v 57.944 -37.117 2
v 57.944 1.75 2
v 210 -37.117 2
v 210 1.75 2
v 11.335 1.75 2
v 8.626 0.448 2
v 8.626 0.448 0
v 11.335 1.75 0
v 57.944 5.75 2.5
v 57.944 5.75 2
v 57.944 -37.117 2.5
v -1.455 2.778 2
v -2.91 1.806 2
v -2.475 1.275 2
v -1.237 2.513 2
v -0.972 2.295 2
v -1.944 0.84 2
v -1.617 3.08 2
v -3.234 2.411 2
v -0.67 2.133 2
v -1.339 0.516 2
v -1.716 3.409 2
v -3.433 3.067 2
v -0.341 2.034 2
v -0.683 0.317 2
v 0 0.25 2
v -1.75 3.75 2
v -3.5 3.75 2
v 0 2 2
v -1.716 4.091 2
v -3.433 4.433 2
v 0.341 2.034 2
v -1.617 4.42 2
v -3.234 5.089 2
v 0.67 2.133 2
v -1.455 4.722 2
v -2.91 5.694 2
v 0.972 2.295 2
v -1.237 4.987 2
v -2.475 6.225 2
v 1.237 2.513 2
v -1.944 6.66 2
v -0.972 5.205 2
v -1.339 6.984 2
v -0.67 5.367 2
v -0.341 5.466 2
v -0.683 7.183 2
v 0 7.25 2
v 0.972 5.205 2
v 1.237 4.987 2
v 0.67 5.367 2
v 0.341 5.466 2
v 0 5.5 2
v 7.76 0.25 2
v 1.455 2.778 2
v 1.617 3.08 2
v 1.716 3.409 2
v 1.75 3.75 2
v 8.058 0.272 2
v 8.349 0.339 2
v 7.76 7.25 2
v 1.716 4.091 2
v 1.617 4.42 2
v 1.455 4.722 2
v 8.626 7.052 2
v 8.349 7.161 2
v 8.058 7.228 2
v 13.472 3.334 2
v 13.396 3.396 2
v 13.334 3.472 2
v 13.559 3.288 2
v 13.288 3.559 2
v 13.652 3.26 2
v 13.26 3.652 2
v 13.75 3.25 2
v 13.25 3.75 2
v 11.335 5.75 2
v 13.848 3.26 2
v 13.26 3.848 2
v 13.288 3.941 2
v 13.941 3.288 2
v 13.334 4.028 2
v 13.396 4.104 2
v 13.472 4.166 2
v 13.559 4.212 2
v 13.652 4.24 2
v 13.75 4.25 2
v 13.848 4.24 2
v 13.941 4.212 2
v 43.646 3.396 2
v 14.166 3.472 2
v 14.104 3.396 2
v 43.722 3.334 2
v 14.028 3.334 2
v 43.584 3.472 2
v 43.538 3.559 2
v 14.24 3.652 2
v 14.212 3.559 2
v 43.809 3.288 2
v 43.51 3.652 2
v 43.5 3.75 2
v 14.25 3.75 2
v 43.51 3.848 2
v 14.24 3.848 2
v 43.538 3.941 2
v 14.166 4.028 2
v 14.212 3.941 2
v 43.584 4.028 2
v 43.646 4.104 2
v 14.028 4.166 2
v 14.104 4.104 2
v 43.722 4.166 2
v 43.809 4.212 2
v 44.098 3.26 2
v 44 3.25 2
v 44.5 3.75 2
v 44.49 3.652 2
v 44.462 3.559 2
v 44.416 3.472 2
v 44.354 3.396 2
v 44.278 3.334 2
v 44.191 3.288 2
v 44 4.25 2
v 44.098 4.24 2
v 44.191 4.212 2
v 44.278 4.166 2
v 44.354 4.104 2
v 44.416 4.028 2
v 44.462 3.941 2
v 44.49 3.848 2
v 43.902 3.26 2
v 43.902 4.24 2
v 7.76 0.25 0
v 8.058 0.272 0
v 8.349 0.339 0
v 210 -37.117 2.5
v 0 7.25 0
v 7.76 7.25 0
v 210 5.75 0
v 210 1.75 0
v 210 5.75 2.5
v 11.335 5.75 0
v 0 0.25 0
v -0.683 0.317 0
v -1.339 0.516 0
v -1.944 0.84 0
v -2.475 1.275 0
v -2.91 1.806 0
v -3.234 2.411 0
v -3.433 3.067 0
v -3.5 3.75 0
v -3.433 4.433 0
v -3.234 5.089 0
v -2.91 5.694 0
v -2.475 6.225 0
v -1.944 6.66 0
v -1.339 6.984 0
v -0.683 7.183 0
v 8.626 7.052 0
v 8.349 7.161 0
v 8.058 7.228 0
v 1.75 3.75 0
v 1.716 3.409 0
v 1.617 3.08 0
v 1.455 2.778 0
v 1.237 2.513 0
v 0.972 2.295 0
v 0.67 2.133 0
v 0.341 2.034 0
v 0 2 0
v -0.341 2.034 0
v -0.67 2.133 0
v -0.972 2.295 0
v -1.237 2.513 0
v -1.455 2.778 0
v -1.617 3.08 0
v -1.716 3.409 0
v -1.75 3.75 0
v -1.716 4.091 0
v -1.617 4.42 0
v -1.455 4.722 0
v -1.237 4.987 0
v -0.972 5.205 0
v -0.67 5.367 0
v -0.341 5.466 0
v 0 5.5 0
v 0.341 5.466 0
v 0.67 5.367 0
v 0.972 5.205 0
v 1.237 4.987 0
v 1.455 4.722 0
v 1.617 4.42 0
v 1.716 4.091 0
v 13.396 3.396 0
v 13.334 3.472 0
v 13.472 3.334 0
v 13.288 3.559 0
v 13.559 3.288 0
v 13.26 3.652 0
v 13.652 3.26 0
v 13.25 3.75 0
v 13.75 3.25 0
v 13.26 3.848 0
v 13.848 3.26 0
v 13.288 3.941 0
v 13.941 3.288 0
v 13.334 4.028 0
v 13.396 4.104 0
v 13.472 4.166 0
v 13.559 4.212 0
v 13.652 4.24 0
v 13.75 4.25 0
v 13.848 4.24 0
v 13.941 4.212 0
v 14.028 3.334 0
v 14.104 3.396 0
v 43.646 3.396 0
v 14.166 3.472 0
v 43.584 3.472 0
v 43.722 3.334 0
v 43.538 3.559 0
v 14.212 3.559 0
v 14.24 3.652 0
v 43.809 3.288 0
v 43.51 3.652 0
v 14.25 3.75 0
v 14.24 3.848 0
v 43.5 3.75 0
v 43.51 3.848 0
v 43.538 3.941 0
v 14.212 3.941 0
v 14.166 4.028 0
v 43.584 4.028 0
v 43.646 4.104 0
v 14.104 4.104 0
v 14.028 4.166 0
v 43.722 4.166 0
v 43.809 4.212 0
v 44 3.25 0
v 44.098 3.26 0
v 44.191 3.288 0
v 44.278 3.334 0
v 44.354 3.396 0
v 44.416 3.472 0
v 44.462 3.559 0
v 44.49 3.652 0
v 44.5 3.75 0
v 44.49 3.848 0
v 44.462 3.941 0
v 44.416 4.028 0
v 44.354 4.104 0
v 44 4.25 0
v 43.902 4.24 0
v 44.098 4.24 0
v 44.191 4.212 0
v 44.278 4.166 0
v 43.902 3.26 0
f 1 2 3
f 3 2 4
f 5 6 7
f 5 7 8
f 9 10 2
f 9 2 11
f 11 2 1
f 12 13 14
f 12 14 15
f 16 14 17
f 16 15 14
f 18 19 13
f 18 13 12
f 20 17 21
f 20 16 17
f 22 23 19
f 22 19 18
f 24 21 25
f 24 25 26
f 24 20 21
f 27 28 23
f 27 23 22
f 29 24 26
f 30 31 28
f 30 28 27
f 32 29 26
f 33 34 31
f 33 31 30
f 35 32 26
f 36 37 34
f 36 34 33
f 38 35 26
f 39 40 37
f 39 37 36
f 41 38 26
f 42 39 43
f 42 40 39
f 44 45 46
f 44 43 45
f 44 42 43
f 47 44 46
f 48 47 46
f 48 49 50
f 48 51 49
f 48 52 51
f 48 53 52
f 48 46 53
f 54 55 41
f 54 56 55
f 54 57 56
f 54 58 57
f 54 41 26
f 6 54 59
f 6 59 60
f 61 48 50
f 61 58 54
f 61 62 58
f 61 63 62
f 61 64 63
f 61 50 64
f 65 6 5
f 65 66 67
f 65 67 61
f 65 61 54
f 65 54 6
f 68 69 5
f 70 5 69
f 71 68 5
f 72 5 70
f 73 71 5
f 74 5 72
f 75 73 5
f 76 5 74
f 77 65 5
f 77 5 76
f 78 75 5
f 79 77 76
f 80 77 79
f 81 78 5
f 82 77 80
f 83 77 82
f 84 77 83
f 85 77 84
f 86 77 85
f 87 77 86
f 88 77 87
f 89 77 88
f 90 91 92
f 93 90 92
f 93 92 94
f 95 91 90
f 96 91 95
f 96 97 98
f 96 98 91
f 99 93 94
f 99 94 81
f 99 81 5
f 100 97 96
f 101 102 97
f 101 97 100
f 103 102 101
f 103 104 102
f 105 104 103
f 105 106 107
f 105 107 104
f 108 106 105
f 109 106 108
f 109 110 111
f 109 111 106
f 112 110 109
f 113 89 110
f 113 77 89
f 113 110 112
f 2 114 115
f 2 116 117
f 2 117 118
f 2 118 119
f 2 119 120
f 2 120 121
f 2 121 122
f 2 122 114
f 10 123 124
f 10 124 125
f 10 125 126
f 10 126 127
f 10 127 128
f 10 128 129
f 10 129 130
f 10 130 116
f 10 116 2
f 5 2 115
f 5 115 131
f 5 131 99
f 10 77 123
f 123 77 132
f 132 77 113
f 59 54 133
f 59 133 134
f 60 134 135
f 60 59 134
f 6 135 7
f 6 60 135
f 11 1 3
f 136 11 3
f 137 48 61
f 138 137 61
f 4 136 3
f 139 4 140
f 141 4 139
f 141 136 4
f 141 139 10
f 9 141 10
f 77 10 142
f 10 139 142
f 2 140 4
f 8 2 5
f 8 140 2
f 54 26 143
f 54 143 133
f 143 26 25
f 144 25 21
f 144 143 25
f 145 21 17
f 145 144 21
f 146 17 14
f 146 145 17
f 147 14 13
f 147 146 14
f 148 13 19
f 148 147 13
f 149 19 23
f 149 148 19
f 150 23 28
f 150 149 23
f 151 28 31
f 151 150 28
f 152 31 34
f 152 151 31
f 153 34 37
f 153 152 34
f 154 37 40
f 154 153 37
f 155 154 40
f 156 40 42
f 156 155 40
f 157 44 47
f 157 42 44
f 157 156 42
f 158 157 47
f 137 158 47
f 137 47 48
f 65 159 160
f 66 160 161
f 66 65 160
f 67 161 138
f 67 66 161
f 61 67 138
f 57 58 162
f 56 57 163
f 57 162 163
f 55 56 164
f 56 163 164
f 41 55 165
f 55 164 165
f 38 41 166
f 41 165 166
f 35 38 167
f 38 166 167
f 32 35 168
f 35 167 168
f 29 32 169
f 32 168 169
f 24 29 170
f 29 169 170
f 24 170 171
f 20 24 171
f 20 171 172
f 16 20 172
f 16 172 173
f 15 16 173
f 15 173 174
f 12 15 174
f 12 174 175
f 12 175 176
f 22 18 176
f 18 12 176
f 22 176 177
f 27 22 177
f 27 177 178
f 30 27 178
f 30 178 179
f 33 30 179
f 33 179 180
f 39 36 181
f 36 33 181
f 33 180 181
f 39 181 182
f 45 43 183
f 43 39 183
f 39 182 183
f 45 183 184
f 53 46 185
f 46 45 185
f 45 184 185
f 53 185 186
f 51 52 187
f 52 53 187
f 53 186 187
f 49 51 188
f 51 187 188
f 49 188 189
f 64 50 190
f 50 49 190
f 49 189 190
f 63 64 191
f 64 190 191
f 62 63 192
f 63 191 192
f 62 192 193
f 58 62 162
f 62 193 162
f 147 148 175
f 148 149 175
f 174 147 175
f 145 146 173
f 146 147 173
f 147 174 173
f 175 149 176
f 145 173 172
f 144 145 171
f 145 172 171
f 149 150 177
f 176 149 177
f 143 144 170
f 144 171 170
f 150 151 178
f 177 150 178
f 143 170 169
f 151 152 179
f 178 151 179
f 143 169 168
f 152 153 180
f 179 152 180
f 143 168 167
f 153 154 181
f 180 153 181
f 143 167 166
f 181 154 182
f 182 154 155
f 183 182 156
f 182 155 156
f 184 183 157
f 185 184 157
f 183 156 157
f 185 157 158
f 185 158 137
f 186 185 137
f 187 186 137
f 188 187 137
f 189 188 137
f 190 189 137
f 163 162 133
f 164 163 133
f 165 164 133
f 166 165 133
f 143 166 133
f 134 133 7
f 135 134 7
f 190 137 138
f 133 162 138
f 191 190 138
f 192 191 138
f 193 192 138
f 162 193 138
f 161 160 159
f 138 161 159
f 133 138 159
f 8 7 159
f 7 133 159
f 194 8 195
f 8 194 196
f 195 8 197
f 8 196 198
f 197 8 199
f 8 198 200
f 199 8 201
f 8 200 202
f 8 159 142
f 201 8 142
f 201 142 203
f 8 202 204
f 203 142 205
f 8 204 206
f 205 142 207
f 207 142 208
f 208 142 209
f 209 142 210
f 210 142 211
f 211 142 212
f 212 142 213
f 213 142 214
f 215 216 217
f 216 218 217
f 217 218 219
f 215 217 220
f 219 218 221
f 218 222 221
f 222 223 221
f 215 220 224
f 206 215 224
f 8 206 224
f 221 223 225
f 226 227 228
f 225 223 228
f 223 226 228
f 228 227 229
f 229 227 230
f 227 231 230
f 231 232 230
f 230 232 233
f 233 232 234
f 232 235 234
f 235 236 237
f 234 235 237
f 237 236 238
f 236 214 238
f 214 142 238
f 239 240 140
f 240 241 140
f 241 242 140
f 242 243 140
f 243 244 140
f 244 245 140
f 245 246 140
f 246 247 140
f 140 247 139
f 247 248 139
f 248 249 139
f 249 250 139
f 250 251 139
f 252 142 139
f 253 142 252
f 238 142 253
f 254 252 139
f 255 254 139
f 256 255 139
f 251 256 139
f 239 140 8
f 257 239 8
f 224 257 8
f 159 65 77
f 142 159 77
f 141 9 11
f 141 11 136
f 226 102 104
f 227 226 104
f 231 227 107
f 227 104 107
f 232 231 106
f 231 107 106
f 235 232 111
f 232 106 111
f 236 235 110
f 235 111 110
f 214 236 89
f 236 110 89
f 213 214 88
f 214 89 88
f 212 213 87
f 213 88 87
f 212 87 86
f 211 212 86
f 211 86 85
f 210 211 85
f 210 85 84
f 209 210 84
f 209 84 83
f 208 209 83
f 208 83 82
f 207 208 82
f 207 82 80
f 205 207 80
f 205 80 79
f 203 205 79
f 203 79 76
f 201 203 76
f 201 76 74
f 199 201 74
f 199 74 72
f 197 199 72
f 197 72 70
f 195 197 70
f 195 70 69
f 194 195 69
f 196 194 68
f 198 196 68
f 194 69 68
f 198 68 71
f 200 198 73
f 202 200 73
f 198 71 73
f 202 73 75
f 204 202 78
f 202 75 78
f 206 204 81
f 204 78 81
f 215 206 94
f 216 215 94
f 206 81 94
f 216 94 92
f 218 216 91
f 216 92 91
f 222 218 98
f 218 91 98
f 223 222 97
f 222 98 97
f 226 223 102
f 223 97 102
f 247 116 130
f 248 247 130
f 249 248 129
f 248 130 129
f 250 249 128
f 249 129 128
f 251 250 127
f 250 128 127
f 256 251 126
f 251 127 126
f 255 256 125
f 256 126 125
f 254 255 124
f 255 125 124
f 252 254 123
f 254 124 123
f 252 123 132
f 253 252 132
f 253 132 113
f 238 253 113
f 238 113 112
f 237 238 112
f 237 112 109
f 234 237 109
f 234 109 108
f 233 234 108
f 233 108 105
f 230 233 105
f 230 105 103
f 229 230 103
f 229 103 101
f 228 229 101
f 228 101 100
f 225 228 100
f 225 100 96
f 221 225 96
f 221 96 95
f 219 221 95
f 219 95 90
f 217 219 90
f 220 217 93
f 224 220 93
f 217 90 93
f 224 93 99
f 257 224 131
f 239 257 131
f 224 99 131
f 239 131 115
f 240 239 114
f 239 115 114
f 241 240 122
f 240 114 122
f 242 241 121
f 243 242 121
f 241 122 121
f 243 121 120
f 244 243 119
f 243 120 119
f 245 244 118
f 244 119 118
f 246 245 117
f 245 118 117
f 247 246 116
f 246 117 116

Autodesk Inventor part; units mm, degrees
ref_plane "YZ Plane" through (0, 0, 0) normal (1, 0, 0) x (0, 1, 0)
ref_plane "XZ Plane" through (0, 0, 0) normal (0, 1, 0) x (-1, 0, 0)
ref_plane "XY Plane" through (0, 0, 0) normal (0, 0, 1) x (1, 0, 0)
sketch "Sketch1" plane through (0, 0, 0) normal (0, 0, 1) x (1, 0, 0)
  circle A0 centre (0, 3.75) radius 1.75 projected
  line L0 (3.5, -3.25) -> (11.1738, -3.25) projected
  line L1 (11.1738, -3.25) -> (11.1738, -5.25) projected
  line L2 (11.1738, -5.25) -> (-11.1738, -5.25) projected
  line L3 (-11.1738, -5.25) -> (-11.1738, -3.25) projected
  line L4 (-11.1738, -3.25) -> (-3.5, -3.25) projected
  line L5 (-3.5, -3.25) -> (-3.5, 3.75) projected
  arc A1 (3.5, 3.75) -> (-3.5, 3.75) centre (0, 3.75) ccw projected
  line L6 (3.5, 3.75) -> (3.5, -3.25) projected
  line L7 (44, 1.75) -> (50, 1.75) projected
  circle A2 centre (0, 3.75) radius 3.5
  line L8 (0, 3.75) -> (250, 3.75)
  line L9 (50, 1.75) -> (0, 1.75)
  line L10 (0, 1.75) -> (0, 3.75)
  line L11 (0, 3.75) -> (50, 3.75)
  line L12 (50, 3.75) -> (50, 1.75)
  line L13 (50, 1.75) -> (250, 1.75)
  line L14 (250, 1.75) -> (250, 3.75)
  line L15 (250, 3.75) -> (50, 3.75)
  line L16 (50, 3.75) -> (50, 1.75)
  line L17 (0, 1.75) -> (250, 1.75)
  line L18 (250, 1.75) -> (250, 5.75)
  line L19 (250, 5.75) -> (0, 5.75)
  line L20 (0, 5.75) -> (0, 1.75)
  circle A3 centre (0, 3.75) radius 3.5
  point P0 (0, 0)
  point P1 (2.8723, 1.75)
  point P2 (2.8723, 5.75)
  dimension "d0" = 250
  dimension "d1" = 2
extrude "Extrusion1" add sketch "Sketch1" along normal blind 2 contours L8 A2 L9 L10 A0 | A0 L20 L19 A1 L8 | A0 L10 L9 A2 A1 L19 L20 | L8 L12 L7 L9 L6 | L6 L9 A2 | A1 L19 L18 L8 | L8 L14 L13 L12
sketch "Sketch2" plane through (0, 0, 2) normal (0, 0, 1) x (1, 0, 0)
  line L0 (13, -15.35) -> (13, -12.35) projected
  line L1 (13, -12.35) -> (14.6, -12.35) projected
  line L2 (14.6, -12.35) -> (14.6, -15.35) projected
  line L3 (14.6, -15.35) -> (13, -15.35) projected
  line L4 (15, -16.35) -> (12.5, -16.35) projected
  line L5 (15, -8.75) -> (15, -16.35) projected
  line L6 (15, -8.75) -> (15, -5.25) projected
  line L7 (12.5, -5.25) -> (15, -5.25) projected
  line L8 (12.5, -16.35) -> (12.5, -5.25) projected
  line L9 (44, -8.25) -> (41.5181, -8.25) projected
  line L10 (44, -9.25) -> (46.5, -9.25) projected
  line L11 (13.75, -5.25) -> (13.75, 7.3756)
  line L12 (44, -8.25) -> (44, 8.5683)
  line L13 (2.8723, 1.75) -> (250, 1.75) projected
  line L14 (250, 1.75) -> (250, 5.75) projected
  line L15 (250, 5.75) -> (2.8723, 5.75) projected
  arc A0 (2.8723, 5.75) -> (2.8723, 1.75) centre (0, 3.75) ccw projected
  circle A1 centre (0, 3.75) radius 1.75 projected
  line L16 (250, 5.75) -> (2.8723, 5.75) projected
  line L17 (13.75, 5.75) -> (13.75, 1.75)
  circle A2 centre (13.75, 3.75) radius 0.5
  line L18 (44, 5.75) -> (44, 1.75)
  line L19 (2.8723, 1.75) -> (250, 1.75) projected
  circle A3 centre (44, 3.75) radius 0.5
  point P0 (0, 0)
  dimension "d4" = 1
  dimension "d5" = 1
extrude "Extrusion2" cut sketch "Sketch2" against normal blind 2 contours A2 L11 | L11 A2 | A3 L12 | L12 A3
sketch "Sketch3" plane through (0, 0, 2) normal (0, 0, 1) x (1, 0, 0)
  line L0 (50, -24.1664) -> (50, 13.5237) projected
  circle A0 centre (44, 3.75) radius 0.5 projected
  circle A1 centre (13.75, 3.75) radius 0.5 projected
  line L1 (2.8723, 1.75) -> (250, 1.75) projected
  line L2 (250, 1.75) -> (250, 5.75) projected
  line L3 (250, 5.75) -> (2.8723, 5.75) projected
  arc A2 (2.8723, 5.75) -> (2.8723, 1.75) centre (0, 3.75) ccw projected
  circle A3 centre (0, 3.75) radius 1.75 projected
  line L4 (-50, -43.45) -> (50, -43.45) projected
  line L5 (250, 5.75) -> (57.9443, 5.75)
  line L6 (57.9443, 5.75) -> (57.9443, -37.1171)
  line L7 (57.9443, -37.1171) -> (250, -37.1171)
  line L8 (250, -37.1171) -> (250, 5.75)
  point P0 (0, 0)
  point P1 (57.9443, 5.75)
extrude "Extrusion3" add sketch "Sketch3" along normal blind 0.5 contours L6 L3 L2 L1 | L1 L8 L7 L6
sketch "Sketch4" plane through (0, 0, 2.5) normal (0, 0, 1) x (1, 0, 0)
  line L0 (250, -37.1171) -> (250, 5.75) projected
  line L1 (250, 5.75) -> (57.9443, 5.75) projected
  line L2 (57.9443, 5.75) -> (57.9443, -37.1171) projected
  line L3 (57.9443, -37.1171) -> (250, -37.1171) projected
  line L4 (250, -37.1171) -> (250, 1.75) projected
  line L5 (250, -37.1171) -> (210, -37.1171)
  line L6 (210, -37.1171) -> (210, 5.75)
  line L7 (210, 5.75) -> (250, 5.75)
  line L8 (250, 5.75) -> (250, -37.1171)
  point P0 (0, 0)
  dimension "d10" = 40
extrude "Extrusion4" cut sketch "Sketch4" against normal through all contours L3 L6 L1 L0
sketch "Sketch5" plane through (0, 0, 2) normal (0, 0, 1) x (1, 0, 0)
  line L0 (57.9443, 1.75) -> (57.9443, 5.75) projected
  line L1 (57.9443, 5.75) -> (2.8723, 5.75) projected
  arc A0 (2.8723, 5.75) -> (2.8723, 1.75) centre (0, 3.75) ccw projected
  line L2 (2.8723, 1.75) -> (57.9443, 1.75) projected
  circle A1 centre (44, 3.75) radius 0.5 projected
  circle A2 centre (13.75, 3.75) radius 0.5 projected
  circle A3 centre (0, 3.75) radius 1.75 projected
  arc A4 (2.8723, 5.75) -> (2.8723, 1.75) centre (0, 3.75) ccw projected
  line L3 (0, 0.25) -> (7.7599, 0.25)
  line L4 (8.6265, 0.4475) -> (11.3354, 1.75)
  line L5 (2.8723, 1.75) -> (57.9443, 1.75) projected
  arc A5 (7.7599, 0.25) -> (8.6265, 0.4475) centre (7.7599, 2.25) ccw
  line L6 (0, 3.75) -> (10.3738, 3.75)
  line L7 (0, 7.25) -> (7.7599, 7.25)
  line L8 (8.6265, 7.0525) -> (11.3354, 5.75)
  arc A6 (8.6265, 7.0525) -> (7.7599, 7.25) centre (7.7599, 5.25) ccw
  point P0 (0, 0)
  dimension "d13" = 2
extrude "Extrusion5" add sketch "Sketch5" against normal up to surface (2 mm away) contours L4 A5 L3 A0 L2 | L1 A0 L7 A6 L8
properties part number "wachlarz_1"
